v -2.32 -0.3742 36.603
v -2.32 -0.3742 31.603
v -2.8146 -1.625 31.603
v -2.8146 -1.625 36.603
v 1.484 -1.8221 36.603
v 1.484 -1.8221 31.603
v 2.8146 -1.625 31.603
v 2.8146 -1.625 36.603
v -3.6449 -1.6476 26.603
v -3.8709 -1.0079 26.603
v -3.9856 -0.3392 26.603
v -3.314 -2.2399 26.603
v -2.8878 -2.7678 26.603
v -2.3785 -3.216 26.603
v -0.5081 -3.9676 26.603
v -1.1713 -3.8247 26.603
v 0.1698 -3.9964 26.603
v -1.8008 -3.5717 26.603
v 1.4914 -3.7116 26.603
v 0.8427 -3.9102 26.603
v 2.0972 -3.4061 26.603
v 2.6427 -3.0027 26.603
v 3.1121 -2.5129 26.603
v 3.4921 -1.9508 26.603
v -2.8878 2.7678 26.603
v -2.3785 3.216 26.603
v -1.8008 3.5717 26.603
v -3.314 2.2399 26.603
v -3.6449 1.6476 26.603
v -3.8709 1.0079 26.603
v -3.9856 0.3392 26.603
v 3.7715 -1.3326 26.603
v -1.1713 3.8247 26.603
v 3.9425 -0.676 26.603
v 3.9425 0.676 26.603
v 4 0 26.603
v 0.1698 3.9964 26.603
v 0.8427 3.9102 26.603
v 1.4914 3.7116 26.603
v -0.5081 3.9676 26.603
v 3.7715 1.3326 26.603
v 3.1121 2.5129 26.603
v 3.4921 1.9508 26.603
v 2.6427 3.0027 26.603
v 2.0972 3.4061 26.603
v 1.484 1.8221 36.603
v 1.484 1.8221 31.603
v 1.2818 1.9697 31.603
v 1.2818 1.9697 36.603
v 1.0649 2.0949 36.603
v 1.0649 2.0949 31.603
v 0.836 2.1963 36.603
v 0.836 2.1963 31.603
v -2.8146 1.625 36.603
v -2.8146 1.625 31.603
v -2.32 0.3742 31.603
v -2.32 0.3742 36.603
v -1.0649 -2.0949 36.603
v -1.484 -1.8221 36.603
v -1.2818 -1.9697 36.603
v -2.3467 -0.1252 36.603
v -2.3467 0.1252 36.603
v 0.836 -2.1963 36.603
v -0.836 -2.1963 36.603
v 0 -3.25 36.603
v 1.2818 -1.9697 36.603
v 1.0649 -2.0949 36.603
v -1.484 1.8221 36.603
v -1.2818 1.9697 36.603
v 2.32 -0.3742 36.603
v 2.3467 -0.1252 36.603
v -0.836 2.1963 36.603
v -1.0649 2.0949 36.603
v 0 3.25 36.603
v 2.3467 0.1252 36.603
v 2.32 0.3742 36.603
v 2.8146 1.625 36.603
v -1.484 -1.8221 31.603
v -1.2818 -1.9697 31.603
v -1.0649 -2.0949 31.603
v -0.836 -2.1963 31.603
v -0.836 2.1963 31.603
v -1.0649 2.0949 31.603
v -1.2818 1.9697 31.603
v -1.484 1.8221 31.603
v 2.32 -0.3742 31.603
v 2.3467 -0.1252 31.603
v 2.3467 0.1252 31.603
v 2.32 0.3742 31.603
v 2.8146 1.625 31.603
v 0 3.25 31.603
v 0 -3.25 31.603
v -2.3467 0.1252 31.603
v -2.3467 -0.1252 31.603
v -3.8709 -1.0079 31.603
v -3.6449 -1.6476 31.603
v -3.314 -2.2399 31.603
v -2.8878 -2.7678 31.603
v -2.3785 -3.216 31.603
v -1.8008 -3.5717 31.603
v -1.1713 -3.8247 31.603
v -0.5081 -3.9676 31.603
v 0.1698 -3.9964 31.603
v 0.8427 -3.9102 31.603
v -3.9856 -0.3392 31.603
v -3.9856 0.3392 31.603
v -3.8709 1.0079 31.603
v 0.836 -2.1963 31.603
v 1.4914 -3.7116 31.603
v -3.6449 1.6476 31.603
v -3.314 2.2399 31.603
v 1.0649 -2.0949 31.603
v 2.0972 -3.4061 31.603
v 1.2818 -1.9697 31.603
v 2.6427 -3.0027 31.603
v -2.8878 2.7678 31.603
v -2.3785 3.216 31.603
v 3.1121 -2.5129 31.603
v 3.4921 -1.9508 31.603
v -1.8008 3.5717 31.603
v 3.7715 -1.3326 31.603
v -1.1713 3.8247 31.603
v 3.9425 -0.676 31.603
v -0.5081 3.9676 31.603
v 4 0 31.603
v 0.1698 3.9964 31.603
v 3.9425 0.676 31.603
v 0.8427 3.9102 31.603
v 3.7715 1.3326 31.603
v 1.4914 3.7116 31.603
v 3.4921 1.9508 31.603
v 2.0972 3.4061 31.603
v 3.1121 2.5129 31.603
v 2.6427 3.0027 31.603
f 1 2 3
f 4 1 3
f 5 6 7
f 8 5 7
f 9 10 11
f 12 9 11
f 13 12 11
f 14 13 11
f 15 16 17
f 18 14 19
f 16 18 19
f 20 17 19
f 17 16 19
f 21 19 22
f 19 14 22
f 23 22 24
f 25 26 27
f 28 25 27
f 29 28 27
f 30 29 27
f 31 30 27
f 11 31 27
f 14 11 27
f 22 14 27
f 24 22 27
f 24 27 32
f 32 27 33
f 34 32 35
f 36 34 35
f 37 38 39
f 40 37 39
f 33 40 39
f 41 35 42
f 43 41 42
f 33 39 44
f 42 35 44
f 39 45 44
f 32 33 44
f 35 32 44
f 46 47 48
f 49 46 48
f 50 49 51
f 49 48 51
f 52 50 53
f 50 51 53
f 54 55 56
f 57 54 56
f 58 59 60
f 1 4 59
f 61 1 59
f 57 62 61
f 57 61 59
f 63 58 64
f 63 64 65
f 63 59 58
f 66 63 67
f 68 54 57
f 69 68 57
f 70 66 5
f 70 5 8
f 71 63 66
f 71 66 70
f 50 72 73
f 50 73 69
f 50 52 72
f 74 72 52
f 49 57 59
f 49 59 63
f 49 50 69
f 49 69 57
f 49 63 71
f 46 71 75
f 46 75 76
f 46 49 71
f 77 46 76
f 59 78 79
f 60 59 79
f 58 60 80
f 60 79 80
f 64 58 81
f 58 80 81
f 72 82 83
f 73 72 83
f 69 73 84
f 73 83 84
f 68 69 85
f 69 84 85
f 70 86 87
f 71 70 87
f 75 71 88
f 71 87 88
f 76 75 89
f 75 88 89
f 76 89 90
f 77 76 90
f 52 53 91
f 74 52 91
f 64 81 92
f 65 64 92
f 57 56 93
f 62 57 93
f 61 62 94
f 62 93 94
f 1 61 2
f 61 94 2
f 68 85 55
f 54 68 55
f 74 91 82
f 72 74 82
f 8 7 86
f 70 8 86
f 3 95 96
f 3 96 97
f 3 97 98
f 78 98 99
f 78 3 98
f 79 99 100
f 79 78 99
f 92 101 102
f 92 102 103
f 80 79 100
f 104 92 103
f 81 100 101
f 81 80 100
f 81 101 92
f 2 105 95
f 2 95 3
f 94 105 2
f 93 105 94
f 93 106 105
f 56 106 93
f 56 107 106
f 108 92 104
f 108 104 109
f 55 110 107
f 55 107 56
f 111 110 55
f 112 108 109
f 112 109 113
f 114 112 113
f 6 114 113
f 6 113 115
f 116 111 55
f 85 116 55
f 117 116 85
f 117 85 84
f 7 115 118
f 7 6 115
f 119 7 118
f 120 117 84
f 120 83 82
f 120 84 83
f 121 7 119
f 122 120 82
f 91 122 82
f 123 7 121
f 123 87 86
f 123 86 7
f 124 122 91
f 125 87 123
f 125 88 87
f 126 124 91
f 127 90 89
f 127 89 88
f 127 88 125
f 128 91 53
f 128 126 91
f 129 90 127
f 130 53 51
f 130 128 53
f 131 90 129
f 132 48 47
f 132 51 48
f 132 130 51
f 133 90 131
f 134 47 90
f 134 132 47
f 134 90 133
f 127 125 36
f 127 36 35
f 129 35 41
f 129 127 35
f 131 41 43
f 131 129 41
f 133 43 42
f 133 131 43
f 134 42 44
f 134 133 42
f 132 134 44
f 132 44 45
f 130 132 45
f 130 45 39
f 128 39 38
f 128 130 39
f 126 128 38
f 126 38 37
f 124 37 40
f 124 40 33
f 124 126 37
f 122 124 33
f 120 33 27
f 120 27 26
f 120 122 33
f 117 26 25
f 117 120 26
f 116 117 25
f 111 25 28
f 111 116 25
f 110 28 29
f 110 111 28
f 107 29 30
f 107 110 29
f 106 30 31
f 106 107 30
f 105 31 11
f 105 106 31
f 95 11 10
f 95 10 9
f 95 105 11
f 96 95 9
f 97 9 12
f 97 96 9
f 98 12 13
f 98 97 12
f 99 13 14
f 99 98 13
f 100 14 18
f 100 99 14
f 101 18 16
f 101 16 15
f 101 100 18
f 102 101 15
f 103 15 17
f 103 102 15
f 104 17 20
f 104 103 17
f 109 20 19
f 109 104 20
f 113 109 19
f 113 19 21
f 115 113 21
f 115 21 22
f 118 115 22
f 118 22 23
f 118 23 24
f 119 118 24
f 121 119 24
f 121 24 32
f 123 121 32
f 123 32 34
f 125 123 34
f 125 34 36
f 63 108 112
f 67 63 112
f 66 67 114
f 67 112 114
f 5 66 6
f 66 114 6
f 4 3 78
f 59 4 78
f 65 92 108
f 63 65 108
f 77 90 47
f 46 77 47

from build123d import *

# Parameters (mm, degrees)
SKETCH_2_R      = 2.35
EXTRUDE_2_DEPTH = 5
SKETCH_3_R      = 4
EXTRUDE_4_DEPTH = 5


with BuildPart() as part:
    # Эскиз2 → Бобышка-Вытянуть2 (new body)
    with BuildSketch(Plane.XY.offset(31.602998)):
        Circle(SKETCH_2_R)
        with BuildLine():
            Line((0, 3.25), (-0.83598392, 2.196276596))
            ThreePointArc((-0.83598392, 2.196276596), (0, 2.35), (0.83598392, 2.196276596))
            Line((0.83598392, 2.196276596), (0, 3.25))
        make_face()
        with BuildLine():
            Line((2.814582562, 1.625), (1.484039366, 1.82212161))
            ThreePointArc((1.484039366, 1.82212161), (2.035159699, 1.175), (2.320023286, 0.374154986))
            Line((2.320023286, 0.374154986), (2.814582562, 1.625))
        make_face()
        with BuildLine():
            Line((2.814582562, -1.625), (2.320023286, -0.374154986))
            ThreePointArc((2.320023286, -0.374154986), (2.035159699, -1.175), (1.484039366, -1.82212161))
            Line((1.484039366, -1.82212161), (2.814582562, -1.625))
        make_face()
        with BuildLine():
            ThreePointArc((0.83598392, -2.196276596), (0, -2.35), (-0.83598392, -2.196276596))
            Line((-0.83598392, -2.196276596), (0, -3.25))
            Line((0, -3.25), (0.83598392, -2.196276596))
        make_face()
        with BuildLine():
            ThreePointArc((-1.484039366, -1.82212161), (-2.035159699, -1.175), (-2.320023286, -0.374154986))
            Line((-2.320023286, -0.374154986), (-2.814582562, -1.625))
            Line((-2.814582562, -1.625), (-1.484039366, -1.82212161))
        make_face()
        with BuildLine():
            ThreePointArc((-2.320023286, 0.374154986), (-2.035159699, 1.175), (-1.484039366, 1.82212161))
            Line((-1.484039366, 1.82212161), (-2.814582562, 1.625))
            Line((-2.814582562, 1.625), (-2.320023286, 0.374154986))
        make_face()
    extrude(amount=EXTRUDE_2_DEPTH)

    # Эскиз3 → Бобышка-Вытянуть4 (add)
    with BuildSketch(Plane.XY.offset(31.602998)):
        Circle(SKETCH_3_R)
    extrude(amount=-EXTRUDE_4_DEPTH)


solid = part.part
